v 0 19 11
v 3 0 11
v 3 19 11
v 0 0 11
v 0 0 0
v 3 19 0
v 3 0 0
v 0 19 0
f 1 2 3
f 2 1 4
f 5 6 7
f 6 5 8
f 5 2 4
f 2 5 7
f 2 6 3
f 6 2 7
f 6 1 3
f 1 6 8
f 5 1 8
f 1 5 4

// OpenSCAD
// Generated by SolidPython 1.0.1 on 2020-07-29 00:46:54


cube(size = [3, 19, 11]);
/***********************************************
*********      SolidPython code:      **********
************************************************
 
# import packages: SolidPython
from solid import *
from solid.utils import *
from itertools import chain, combinations, permutations


class Resize:

    def __init__(self, scad_file):
        self.scad_file = scad_file
        #self.scad_file = import_scad(scad_file)
        # cone/cylinder param:
        self.r1 = 0
        self.r2 = 0
        self.h = 0
        # rectangular prism param:
        self.w = 0
        self.l = 0
        # ellipse param:
        self.r = 0

    # import OpenScad code (file name corresponds to shape)


    # classify shape + parameters
    def assign(self, param1, param2, param3):
        if self.scad_file == 'cone.scad':
            self.r1 = param1
            self.r2 = param2
            self.h = param3
        elif self.scad_file == 'cylinder.scad':
            self.r1 = param1
            self.r2 = param2
            self.h = param3
        elif self.scad_file == 'rectangularPrism.scad':
            self.h = param1
            self.l = param2
            self.w = param3
        else:
            self.r = param1
            self.h = param2

    # resize parameters
    def iterate(self):
        x = range(3, 20, 2)
        i = 1
        if self.scad_file == 'cone.scad':
            tempList = list(permutations(x, 2))
            for temp in tempList:
                param1 = temp[0]
                param2 = temp[1]
                filepath = 'produced_scad_files/' + 'cone' + str(param1) + '_' + str(param2) + '_' + '.scad'
                scad_render_to_file(cylinder(h=param1, r1=param2, r2=0), filepath)

        elif self.scad_file == 'cylinder.scad':
            tempList = list(permutations(x, 3))
            for temp in tempList:
                param1 = temp[0]
                param2 = temp[1]
                filepath = 'produced_scad_files/' + 'cylinder' + str(param1) + '_' + str(param2) + '_' + '.scad'
                scad_render_to_file(cylinder(h=param1, r1=param2, r2=param2), filepath)

        elif self.scad_file == 'rectangularPrism.scad':
            tempList = list(permutations(x, 3))
            for temp in tempList:
                param1 = temp[0]
                param2 = temp[1]
                param3 = temp[2]
                filepath = 'produced_scad_files/' + 'rectangularPrism' + str(param1) + '_' + str(param2) + '_' + str(
                    param3) + '.scad'
                scad_render_to_file(cube(size=(param1, param2, param3)), filepath)

        elif self.scad_file == 'ellipse.scad':
            tempList = list(permutations(x, 4))
            for temp in tempList:
                param1 = temp[0]
                param2 = temp[1]
                param3 = temp[2]
                param4 = temp[3]
                filepath = 'produced_scad_files/' + 'ellipse' + str(param1) + '_' + str(param2) + '_' + str(param3) + '_' + str(param4) + '.scad'
                scad_render_to_file(scale([param1, param2, param3])(sphere(r=param4)), filepath)

    def render_to_scadfile(self):
        scad_render_to_file(scad, 'example.scad') 
 
************************************************/
